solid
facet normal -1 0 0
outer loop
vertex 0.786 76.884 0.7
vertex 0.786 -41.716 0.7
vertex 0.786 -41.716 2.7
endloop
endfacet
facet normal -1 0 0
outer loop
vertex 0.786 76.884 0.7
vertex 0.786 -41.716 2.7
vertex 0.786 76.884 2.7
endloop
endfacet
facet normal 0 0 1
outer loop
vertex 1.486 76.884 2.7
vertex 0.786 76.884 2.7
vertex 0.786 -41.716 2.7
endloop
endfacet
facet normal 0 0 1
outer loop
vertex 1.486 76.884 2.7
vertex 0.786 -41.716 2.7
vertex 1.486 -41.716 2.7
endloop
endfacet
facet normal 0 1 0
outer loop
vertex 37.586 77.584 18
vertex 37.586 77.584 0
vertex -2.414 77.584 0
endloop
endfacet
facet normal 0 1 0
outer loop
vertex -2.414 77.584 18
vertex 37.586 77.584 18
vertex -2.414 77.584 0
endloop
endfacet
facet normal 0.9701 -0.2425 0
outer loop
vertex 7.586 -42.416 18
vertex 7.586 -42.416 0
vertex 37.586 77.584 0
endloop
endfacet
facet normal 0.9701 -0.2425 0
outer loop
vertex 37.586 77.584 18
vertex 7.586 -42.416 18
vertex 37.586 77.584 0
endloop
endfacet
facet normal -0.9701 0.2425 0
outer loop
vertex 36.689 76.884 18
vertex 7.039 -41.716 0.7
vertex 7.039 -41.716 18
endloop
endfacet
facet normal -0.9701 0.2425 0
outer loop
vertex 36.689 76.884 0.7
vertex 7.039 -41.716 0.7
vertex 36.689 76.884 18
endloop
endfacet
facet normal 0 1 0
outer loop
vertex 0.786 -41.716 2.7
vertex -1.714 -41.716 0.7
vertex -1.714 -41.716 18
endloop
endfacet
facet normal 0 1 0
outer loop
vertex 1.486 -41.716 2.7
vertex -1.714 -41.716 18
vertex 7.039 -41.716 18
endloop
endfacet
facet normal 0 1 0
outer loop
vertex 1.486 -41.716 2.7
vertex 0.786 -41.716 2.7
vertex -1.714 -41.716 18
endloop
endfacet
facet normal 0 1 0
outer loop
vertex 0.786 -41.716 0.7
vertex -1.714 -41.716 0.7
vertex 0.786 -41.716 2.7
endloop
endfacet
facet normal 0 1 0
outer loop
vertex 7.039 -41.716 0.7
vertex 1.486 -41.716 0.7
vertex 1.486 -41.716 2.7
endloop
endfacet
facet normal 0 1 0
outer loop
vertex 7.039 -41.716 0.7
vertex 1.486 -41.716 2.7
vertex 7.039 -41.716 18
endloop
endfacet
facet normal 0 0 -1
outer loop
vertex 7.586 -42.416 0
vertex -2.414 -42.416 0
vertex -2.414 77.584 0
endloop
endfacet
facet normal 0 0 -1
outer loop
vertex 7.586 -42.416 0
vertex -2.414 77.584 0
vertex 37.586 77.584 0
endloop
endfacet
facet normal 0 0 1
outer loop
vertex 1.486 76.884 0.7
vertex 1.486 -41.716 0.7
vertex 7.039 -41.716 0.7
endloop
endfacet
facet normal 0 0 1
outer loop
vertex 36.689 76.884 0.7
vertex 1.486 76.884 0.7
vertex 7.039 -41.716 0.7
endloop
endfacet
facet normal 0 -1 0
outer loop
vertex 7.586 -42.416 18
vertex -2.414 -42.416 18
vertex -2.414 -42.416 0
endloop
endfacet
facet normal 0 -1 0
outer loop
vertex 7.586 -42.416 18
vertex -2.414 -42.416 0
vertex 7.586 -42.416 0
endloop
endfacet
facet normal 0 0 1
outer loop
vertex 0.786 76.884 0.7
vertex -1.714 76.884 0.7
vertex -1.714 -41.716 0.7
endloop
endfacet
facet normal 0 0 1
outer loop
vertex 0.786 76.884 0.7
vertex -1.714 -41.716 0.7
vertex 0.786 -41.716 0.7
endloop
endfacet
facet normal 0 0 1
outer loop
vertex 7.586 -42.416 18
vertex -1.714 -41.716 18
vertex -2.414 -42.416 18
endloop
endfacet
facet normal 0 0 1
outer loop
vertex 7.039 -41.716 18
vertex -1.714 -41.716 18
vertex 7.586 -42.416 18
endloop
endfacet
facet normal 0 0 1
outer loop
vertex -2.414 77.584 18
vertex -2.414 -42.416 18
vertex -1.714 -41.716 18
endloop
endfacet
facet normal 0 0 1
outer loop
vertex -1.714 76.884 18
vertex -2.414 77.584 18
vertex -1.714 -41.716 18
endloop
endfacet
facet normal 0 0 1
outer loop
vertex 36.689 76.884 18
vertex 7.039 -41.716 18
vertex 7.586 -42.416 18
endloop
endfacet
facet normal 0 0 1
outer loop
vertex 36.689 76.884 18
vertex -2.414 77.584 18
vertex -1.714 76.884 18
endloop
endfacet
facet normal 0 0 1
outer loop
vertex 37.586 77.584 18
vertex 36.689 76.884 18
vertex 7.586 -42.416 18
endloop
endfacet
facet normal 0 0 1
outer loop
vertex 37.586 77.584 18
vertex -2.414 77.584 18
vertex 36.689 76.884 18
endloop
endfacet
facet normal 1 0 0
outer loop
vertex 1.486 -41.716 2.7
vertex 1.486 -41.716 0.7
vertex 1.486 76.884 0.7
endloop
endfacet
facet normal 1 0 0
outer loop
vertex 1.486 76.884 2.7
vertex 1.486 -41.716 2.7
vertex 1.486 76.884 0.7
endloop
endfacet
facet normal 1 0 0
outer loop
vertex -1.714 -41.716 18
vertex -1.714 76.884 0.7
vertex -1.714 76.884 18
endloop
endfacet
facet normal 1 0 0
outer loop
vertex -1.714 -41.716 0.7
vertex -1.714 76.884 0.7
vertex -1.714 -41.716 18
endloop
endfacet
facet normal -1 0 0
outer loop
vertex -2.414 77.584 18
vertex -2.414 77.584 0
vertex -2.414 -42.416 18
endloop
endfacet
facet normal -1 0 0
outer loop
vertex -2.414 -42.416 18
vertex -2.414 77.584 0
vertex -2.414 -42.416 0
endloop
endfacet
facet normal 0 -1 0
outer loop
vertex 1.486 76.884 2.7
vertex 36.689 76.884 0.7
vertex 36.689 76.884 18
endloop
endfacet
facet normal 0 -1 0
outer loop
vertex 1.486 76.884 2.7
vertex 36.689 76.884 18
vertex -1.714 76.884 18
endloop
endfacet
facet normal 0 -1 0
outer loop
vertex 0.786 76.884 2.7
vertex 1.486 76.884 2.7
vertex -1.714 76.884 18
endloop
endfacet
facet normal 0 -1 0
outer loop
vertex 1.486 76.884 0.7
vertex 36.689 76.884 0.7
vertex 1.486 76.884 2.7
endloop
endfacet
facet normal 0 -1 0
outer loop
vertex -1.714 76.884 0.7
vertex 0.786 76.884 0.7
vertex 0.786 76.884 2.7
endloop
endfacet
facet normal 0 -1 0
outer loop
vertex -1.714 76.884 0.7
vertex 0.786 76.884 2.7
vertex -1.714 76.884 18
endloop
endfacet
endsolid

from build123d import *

# Parameters (mm, degrees)
F1_DEPTH = 18
F2_T     = -0.7
F4_W     = 0.7
F4_H     = 118.6
F5_DEPTH = 2


with BuildPart() as f1:
    # F0 (on Top) → F1 (new body)
    with BuildSketch(Plane.XY):
        Polygon((37.585583, 77.584211), (-2.414417, 77.584211), (-2.414417, -42.415789), (7.585583, -42.415789), align=None)
    extrude(amount=F1_DEPTH)

    # F2
    f2_openings = [f1.faces().sort_by_distance(p)[0] for p in [
        (11.585583, 29.584211, 18),
    ]]
    offset(amount=F2_T, openings=f2_openings)

    # F4 (on face) → F5 (join)
    with BuildSketch(Plane.XY.offset(0.7)):
        with Locations((1.135583, 17.584211)):
            Rectangle(F4_W, F4_H)
    extrude(amount=F5_DEPTH)


solid = f1.part
